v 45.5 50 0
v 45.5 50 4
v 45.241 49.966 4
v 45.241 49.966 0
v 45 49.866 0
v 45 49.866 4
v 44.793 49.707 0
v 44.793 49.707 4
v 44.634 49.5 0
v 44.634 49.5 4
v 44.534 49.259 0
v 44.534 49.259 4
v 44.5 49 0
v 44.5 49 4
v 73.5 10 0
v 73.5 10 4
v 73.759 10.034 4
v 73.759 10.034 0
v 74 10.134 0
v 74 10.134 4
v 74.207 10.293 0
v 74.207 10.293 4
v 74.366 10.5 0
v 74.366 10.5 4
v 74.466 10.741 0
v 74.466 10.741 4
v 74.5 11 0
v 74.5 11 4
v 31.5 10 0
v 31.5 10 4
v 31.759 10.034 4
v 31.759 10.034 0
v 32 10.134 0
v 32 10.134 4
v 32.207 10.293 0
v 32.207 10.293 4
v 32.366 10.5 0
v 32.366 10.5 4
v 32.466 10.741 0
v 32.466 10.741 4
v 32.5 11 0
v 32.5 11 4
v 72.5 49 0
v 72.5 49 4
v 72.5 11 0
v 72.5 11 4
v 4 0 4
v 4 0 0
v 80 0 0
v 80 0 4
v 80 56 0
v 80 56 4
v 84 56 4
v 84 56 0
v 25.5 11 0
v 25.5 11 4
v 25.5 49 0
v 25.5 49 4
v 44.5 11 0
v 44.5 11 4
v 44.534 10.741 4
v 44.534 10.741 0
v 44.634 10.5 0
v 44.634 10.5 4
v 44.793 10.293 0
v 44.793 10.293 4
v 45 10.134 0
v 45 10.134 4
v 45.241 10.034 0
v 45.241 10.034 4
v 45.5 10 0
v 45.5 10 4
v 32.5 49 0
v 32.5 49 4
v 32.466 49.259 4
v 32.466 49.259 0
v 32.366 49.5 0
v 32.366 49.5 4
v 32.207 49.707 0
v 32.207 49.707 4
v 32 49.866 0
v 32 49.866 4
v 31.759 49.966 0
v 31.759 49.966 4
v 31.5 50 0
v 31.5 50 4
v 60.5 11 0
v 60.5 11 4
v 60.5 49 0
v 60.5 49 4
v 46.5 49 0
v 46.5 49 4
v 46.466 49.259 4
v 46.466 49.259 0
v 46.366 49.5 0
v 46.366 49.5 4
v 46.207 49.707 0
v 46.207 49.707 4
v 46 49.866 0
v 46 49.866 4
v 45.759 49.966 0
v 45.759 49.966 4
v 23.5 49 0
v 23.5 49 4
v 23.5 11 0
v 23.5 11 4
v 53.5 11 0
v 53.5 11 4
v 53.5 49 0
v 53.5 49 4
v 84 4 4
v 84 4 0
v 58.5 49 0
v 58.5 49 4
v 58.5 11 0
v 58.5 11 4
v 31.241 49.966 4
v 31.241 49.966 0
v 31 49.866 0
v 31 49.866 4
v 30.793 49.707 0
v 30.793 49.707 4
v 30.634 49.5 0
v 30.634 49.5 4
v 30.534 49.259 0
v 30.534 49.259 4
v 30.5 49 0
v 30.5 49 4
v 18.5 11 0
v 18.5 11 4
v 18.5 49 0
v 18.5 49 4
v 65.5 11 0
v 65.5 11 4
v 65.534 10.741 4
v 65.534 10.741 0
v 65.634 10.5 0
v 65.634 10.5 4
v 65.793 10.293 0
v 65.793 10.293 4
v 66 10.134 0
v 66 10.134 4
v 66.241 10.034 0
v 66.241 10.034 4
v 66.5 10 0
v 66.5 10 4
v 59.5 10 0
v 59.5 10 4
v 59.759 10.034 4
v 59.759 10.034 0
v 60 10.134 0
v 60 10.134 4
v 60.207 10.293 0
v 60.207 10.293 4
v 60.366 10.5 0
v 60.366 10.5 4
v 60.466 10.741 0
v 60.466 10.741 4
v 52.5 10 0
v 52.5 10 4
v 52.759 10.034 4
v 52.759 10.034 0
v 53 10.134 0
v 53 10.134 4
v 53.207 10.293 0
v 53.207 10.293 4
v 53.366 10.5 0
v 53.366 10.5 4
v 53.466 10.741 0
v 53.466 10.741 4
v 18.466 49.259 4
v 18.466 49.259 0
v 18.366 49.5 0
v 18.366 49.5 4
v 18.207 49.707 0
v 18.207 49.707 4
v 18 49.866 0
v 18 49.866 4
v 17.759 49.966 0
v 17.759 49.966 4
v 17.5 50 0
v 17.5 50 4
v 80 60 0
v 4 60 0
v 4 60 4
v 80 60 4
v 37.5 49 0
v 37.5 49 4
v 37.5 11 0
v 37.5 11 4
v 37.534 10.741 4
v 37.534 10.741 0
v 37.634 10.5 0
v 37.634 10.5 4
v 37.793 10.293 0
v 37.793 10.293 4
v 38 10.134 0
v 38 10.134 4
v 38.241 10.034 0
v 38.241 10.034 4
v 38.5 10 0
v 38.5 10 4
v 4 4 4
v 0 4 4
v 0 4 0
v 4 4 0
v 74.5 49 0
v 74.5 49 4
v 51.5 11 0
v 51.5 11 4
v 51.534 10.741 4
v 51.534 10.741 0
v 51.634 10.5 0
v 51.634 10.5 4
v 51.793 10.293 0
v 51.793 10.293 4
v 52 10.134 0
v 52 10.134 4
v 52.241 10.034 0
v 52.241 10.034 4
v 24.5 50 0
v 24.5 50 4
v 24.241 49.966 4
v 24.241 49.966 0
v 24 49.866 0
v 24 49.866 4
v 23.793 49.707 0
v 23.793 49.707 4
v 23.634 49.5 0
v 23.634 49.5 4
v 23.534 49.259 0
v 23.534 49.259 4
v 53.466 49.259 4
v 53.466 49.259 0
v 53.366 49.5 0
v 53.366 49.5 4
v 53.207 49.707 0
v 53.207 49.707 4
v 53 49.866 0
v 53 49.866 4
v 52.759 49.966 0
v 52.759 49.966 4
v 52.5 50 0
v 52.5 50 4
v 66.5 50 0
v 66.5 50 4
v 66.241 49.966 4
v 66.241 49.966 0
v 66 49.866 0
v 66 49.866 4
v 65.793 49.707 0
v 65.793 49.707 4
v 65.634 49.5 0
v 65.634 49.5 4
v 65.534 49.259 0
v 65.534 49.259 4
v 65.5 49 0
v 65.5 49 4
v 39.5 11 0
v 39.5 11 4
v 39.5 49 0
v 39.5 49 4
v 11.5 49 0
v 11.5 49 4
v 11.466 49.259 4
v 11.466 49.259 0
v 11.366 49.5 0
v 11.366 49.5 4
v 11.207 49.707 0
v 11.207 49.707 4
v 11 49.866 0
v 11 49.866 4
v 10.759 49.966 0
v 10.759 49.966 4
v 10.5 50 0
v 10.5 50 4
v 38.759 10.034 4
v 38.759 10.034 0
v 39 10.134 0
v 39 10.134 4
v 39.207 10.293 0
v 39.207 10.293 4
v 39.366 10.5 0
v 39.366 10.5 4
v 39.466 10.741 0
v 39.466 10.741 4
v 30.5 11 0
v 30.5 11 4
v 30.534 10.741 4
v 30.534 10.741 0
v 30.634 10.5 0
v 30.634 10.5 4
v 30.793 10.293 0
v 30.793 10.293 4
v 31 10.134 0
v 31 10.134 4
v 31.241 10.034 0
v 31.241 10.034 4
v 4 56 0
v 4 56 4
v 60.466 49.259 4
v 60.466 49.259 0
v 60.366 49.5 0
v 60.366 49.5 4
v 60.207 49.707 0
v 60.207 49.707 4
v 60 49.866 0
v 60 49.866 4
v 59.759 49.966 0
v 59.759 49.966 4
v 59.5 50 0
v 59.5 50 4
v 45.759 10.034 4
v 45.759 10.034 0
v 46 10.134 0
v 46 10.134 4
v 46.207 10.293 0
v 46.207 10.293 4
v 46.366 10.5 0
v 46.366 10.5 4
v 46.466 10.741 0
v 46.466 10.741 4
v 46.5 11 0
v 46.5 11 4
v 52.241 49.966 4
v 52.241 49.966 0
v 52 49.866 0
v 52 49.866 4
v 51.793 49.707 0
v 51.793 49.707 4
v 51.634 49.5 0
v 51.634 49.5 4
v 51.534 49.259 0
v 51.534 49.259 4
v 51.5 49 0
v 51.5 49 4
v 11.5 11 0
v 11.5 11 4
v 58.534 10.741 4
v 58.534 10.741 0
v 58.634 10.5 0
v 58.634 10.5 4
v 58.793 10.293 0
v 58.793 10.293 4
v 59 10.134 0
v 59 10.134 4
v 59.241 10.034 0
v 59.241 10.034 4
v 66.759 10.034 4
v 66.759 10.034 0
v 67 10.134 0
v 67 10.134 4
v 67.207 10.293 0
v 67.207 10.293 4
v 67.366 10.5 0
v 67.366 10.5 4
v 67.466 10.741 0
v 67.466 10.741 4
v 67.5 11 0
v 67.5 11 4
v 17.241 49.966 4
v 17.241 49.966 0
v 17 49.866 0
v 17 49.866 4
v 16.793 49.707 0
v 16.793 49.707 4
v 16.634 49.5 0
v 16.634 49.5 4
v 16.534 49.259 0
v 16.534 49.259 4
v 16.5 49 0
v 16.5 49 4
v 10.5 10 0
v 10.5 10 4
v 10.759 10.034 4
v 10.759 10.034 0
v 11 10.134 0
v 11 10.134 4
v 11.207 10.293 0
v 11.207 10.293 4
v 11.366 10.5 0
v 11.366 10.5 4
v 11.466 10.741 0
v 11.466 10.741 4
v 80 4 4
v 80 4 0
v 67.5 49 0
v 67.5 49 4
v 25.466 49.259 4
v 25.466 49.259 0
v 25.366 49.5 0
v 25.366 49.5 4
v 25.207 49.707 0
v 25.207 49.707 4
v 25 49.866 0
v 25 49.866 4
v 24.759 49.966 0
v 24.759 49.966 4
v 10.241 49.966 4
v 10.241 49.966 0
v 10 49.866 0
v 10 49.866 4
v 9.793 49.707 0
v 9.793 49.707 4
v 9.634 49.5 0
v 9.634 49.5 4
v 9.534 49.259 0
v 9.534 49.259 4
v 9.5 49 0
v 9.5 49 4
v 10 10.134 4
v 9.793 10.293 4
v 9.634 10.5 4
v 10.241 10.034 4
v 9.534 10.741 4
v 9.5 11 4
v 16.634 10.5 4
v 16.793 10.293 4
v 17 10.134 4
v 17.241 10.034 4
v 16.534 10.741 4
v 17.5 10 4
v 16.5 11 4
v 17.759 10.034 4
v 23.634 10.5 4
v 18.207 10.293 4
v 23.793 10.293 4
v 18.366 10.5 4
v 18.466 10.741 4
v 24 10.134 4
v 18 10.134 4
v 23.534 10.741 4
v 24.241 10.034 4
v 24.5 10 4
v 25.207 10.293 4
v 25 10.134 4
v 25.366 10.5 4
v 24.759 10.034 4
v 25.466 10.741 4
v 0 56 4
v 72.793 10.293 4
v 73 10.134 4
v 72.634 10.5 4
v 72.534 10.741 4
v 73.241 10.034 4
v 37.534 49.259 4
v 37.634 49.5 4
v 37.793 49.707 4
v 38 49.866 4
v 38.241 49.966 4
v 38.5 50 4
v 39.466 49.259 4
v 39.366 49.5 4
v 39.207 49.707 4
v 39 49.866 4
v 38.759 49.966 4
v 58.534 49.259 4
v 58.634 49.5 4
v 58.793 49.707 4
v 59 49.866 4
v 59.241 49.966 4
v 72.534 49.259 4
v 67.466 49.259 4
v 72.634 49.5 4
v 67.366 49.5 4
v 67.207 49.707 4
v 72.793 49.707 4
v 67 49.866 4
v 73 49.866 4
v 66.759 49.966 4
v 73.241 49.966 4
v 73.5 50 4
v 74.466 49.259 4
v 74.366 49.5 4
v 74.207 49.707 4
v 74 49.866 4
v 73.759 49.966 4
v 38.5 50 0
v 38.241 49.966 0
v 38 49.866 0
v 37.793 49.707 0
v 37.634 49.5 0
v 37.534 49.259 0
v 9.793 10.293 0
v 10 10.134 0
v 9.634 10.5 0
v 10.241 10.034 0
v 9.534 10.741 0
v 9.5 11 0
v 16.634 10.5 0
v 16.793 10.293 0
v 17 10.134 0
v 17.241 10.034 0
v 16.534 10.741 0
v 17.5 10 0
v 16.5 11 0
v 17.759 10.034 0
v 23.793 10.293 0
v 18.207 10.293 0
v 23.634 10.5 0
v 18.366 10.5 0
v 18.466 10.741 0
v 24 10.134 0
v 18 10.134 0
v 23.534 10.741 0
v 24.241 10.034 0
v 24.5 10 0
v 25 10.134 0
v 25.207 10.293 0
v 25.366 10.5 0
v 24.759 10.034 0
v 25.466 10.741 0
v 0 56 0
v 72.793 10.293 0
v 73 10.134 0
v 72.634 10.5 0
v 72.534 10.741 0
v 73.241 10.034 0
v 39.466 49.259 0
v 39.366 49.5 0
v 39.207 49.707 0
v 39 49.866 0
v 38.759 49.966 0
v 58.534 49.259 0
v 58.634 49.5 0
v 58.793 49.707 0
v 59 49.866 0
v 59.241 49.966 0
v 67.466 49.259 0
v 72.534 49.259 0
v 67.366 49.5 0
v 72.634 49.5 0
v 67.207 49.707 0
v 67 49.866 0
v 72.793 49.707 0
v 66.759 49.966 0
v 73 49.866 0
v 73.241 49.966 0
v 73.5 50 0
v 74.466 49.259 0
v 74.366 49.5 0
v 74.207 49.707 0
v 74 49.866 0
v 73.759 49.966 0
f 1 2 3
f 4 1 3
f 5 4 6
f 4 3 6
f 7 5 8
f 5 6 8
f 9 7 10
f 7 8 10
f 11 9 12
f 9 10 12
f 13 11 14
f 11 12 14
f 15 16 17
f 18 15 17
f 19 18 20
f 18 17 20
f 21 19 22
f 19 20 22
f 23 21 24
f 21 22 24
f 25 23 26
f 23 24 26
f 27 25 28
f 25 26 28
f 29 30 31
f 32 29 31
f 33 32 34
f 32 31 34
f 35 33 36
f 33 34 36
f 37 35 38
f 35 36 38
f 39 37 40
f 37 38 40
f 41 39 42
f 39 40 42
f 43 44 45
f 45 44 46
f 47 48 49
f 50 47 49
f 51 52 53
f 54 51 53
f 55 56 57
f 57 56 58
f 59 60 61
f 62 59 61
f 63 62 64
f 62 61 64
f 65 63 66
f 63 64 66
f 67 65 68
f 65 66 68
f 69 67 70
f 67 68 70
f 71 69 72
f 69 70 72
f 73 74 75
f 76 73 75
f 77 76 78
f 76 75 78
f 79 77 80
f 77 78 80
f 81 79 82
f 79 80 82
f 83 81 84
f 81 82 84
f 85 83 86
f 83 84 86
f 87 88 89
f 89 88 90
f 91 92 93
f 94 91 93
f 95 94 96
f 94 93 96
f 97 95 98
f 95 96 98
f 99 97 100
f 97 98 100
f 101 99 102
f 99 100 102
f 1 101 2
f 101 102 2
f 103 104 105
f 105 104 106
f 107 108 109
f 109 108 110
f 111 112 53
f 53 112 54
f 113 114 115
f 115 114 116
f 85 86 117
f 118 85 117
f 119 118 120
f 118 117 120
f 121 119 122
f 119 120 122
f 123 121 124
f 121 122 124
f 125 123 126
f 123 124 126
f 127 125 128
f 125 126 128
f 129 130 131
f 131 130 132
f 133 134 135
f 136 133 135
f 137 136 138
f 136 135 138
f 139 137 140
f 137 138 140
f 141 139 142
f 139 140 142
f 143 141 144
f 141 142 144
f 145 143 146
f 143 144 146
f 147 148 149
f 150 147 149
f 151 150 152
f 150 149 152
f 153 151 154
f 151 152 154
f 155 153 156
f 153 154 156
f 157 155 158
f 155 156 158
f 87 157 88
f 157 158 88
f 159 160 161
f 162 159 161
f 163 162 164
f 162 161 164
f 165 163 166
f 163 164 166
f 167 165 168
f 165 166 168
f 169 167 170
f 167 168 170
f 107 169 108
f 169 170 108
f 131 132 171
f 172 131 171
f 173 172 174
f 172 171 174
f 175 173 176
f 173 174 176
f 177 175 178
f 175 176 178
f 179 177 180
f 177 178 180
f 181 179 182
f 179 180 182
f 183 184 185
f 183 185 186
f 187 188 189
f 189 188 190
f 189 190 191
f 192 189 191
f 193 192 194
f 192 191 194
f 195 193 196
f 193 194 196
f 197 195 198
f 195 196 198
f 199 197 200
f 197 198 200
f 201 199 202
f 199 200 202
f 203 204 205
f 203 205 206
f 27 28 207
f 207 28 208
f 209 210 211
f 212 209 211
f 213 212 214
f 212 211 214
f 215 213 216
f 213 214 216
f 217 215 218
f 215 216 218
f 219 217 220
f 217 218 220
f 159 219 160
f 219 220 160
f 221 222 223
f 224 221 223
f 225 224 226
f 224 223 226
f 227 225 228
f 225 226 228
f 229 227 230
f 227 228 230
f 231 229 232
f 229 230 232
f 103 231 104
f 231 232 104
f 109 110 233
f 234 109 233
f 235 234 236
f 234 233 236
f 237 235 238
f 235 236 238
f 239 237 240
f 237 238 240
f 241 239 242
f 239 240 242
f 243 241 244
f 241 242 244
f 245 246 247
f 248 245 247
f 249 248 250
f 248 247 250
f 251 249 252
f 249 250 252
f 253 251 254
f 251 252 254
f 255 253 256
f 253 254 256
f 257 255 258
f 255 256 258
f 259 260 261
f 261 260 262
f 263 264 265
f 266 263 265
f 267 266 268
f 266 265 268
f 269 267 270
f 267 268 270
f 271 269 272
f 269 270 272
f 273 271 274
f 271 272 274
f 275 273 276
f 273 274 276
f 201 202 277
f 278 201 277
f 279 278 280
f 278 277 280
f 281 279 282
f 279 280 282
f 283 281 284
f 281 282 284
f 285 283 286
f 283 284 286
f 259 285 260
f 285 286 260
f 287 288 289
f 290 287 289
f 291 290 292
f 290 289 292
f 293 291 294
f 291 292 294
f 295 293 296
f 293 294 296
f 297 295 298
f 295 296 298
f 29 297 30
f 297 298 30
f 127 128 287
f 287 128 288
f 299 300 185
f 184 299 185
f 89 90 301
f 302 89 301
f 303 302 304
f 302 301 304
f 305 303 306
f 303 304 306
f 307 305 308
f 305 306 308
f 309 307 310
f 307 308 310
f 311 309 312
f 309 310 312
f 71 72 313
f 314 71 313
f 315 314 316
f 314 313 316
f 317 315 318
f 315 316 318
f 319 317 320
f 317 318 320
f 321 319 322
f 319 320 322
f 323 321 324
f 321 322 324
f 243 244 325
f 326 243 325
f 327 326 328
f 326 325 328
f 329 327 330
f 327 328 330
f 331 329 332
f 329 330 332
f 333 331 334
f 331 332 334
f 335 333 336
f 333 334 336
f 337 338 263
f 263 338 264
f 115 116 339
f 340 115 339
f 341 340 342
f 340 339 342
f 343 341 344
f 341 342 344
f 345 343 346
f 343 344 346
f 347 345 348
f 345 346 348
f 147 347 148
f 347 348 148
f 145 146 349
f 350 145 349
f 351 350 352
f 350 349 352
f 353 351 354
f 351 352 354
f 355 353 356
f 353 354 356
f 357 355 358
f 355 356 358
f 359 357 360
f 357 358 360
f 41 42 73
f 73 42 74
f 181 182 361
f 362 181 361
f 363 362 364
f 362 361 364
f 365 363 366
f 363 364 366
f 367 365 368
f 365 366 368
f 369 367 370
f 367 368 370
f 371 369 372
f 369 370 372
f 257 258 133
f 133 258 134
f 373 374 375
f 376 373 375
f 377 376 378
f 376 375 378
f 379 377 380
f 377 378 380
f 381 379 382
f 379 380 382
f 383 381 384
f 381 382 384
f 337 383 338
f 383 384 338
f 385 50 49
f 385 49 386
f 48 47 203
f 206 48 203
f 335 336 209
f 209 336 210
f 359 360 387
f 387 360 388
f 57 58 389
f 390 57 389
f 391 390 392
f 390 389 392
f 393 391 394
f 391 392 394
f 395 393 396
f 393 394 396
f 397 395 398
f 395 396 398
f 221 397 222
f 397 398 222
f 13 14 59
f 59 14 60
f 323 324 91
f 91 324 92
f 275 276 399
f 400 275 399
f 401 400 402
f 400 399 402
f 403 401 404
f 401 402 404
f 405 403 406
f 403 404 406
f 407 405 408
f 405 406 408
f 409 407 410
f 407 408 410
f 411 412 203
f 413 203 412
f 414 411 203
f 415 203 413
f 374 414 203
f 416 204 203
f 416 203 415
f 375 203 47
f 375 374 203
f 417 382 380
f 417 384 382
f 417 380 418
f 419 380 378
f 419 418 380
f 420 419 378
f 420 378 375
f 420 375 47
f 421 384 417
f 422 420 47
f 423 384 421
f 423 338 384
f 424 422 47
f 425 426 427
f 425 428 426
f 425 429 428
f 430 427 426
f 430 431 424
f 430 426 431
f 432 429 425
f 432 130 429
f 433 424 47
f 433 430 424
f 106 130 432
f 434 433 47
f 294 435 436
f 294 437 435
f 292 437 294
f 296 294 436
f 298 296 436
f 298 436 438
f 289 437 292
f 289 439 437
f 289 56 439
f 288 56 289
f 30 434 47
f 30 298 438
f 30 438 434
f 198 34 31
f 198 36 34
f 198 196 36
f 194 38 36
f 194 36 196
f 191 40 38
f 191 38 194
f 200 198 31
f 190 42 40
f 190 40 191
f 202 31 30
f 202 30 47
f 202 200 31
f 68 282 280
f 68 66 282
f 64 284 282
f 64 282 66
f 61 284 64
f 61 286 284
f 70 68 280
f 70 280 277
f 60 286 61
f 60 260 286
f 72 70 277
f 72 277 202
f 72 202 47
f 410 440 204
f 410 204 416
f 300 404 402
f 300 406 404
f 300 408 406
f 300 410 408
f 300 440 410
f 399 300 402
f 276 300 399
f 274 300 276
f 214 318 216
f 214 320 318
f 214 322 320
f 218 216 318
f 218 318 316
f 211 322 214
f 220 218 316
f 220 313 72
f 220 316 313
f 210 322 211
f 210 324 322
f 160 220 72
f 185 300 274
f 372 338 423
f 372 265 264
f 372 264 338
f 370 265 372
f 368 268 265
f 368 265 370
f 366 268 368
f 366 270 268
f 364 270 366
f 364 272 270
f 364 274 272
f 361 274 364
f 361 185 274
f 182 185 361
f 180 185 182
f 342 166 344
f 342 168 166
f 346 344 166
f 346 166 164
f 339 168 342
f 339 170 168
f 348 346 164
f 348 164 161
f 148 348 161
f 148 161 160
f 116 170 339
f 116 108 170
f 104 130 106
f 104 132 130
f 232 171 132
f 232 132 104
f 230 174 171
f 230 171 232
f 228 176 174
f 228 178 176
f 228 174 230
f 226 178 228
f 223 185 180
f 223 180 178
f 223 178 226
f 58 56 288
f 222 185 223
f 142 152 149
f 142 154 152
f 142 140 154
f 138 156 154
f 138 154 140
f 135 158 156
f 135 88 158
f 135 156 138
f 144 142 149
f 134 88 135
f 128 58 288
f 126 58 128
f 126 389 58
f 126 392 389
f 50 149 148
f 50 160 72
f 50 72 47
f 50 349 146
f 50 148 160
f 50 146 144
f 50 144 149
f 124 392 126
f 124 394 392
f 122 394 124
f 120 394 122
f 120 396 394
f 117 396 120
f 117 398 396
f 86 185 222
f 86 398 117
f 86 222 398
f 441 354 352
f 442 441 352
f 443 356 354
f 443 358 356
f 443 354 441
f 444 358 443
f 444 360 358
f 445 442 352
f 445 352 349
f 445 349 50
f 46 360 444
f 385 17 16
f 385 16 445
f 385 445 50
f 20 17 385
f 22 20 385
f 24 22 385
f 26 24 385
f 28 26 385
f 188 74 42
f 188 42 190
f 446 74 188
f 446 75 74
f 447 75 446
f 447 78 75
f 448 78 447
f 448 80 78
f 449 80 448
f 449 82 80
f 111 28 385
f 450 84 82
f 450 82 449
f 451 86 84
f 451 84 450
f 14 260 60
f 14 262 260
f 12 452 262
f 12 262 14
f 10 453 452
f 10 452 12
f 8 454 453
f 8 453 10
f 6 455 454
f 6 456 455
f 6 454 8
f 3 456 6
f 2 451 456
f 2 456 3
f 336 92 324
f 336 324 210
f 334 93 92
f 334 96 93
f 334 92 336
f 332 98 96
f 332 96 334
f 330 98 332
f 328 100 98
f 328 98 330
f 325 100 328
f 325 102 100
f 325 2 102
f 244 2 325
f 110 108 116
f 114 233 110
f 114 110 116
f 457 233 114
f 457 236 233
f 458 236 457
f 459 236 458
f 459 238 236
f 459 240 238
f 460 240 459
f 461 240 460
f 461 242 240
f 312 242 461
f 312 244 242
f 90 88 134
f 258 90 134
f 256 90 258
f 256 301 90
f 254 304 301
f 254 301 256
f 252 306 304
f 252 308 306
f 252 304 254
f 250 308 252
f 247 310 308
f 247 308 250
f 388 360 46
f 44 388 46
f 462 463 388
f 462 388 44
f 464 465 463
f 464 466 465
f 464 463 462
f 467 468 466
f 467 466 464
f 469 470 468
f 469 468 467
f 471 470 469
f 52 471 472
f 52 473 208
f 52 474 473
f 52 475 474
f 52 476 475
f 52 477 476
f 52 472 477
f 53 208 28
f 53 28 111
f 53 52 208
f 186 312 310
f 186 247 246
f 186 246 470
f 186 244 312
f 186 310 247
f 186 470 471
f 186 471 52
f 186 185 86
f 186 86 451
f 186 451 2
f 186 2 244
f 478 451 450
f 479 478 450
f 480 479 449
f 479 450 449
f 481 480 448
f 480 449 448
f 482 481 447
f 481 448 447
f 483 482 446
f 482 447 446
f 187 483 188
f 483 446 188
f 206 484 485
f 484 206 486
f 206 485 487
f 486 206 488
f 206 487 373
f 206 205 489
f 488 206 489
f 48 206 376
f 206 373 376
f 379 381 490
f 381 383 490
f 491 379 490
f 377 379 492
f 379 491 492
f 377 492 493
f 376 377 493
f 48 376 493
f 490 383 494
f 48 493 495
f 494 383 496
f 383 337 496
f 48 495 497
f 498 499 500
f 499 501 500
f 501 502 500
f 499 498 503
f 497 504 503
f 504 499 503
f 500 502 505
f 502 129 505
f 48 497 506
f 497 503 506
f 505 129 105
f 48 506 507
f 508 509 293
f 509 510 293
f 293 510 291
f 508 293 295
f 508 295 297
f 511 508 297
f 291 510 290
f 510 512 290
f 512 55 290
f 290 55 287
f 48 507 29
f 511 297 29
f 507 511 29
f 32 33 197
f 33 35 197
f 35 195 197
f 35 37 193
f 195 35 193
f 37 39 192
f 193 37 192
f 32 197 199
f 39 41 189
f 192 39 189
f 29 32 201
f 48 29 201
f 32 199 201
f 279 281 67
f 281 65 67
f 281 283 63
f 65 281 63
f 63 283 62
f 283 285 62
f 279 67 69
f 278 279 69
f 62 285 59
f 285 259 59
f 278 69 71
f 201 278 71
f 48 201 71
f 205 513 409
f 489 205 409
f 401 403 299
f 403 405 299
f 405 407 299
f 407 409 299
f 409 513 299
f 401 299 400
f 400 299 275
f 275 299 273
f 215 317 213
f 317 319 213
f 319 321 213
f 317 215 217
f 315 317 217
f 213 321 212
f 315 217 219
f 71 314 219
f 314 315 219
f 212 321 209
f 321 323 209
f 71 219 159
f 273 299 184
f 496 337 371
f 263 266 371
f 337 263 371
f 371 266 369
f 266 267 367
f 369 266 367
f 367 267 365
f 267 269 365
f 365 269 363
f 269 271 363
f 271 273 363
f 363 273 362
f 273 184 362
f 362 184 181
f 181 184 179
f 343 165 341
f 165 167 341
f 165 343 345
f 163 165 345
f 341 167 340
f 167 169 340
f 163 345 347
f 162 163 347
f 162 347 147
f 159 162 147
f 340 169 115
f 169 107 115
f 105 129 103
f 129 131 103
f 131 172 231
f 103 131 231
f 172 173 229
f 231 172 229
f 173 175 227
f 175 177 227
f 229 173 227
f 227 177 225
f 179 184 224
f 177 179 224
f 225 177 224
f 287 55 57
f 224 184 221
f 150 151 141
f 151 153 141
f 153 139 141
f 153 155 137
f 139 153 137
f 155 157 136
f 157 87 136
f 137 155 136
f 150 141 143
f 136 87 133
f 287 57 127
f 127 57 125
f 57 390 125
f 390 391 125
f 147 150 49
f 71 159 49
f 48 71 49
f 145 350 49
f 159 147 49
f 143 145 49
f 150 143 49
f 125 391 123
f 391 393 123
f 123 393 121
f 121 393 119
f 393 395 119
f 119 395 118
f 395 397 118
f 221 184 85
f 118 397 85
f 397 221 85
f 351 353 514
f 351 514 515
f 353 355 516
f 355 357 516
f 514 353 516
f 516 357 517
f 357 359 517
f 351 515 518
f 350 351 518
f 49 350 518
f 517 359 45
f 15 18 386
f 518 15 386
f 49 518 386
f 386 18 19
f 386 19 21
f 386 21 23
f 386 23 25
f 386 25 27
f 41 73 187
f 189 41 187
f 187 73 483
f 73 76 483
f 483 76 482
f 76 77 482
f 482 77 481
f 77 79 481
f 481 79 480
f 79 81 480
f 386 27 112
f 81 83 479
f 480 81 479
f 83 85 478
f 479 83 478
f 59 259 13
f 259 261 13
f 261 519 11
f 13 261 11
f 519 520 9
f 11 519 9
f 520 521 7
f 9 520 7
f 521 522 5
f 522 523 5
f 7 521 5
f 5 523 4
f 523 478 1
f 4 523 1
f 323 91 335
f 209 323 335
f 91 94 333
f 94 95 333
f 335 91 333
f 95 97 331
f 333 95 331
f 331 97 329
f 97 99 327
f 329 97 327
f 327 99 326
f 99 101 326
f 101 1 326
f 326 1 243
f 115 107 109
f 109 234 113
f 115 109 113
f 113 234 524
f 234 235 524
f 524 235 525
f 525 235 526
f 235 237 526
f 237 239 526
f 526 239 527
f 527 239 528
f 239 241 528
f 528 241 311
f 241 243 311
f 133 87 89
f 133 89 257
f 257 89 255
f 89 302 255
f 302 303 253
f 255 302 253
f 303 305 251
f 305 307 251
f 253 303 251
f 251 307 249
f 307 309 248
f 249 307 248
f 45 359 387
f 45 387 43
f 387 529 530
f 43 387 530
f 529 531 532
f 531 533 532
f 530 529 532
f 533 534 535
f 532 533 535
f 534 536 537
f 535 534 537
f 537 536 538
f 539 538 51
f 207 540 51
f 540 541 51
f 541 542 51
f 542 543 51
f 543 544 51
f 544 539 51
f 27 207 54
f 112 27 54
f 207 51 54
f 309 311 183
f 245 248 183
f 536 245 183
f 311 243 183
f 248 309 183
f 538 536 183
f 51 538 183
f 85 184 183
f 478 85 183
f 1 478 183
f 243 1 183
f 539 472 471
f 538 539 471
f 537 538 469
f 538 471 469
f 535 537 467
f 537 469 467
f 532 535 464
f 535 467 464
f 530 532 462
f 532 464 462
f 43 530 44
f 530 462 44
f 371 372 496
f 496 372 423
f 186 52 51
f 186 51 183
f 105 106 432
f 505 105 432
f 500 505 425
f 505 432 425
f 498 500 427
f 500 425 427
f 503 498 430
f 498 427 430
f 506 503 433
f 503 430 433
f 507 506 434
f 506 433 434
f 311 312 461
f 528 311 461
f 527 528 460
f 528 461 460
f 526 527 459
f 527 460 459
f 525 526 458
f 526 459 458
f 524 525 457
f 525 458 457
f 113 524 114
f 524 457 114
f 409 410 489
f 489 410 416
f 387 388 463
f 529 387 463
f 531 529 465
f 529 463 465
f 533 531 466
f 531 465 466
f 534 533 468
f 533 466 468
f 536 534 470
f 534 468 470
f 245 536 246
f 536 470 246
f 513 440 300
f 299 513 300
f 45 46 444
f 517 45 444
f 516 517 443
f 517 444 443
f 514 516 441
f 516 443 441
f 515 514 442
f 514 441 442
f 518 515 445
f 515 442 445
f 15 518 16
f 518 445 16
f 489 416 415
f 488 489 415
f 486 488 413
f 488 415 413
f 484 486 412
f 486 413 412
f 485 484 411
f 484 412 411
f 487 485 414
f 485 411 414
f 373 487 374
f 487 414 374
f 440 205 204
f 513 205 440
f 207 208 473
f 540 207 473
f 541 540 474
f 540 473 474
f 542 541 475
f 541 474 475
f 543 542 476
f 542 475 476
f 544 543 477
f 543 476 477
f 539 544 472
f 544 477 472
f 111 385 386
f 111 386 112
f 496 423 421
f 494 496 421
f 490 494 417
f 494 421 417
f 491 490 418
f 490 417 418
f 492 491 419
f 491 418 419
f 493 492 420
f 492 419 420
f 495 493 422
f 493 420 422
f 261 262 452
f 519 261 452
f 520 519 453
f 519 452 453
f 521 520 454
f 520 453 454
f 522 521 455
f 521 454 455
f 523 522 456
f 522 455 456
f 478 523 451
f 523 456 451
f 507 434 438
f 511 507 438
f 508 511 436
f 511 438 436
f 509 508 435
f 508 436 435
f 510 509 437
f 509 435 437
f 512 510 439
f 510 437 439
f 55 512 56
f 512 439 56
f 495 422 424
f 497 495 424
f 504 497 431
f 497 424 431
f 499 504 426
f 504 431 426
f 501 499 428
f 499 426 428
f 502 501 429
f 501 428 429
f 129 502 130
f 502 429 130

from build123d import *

# Parameters (mm, degrees)
F0_W     = 84
F0_H     = 60
F1_DEPTH = 4
F2_W     = 4
F2_H     = 4
F3_DEPTH = 4
F5_DEPTH = 4


with BuildPart() as f1:
    # F0 (on Top) → F1 (new body)
    with BuildSketch(Plane.XY):
        with Locations((42, 30)):
            Rectangle(F0_W, F0_H)
    extrude(amount=F1_DEPTH)

    # F2 (on face) → F3 (cut, through all)
    with BuildSketch(Plane.XY.offset(4)):
        with Locations((2, 2)):
            Rectangle(F2_W, F2_H)
        with Locations((2, 58)):
            Rectangle(F2_W, F2_H)
        with Locations((82, 2)):
            Rectangle(F2_W, F2_H)
        with Locations((82, 58)):
            Rectangle(F2_W, F2_H)
    extrude(amount=-F3_DEPTH, mode=Mode.SUBTRACT)

    # F4 (on face) → F5 (cut, through all)
    with BuildSketch(Plane.XY.offset(4)):
        with BuildLine():
            ThreePointArc((10.5, 50), (9.792893, 49.707107), (9.5, 49))
            Line((9.5, 49), (9.5, 11))
            ThreePointArc((9.5, 11), (9.792893, 10.292893), (10.5, 10))
            ThreePointArc((10.5, 10), (11.207107, 10.292893), (11.5, 11))
            Line((11.5, 11), (11.5, 49))
            ThreePointArc((11.5, 49), (11.207107, 49.707107), (10.5, 50))
        make_face()
        with BuildLine():
            ThreePointArc((17.5, 50), (16.792893, 49.707107), (16.5, 49))
            Line((16.5, 49), (16.5, 11))
            ThreePointArc((16.5, 11), (16.792893, 10.292893), (17.5, 10))
            ThreePointArc((17.5, 10), (18.207107, 10.292893), (18.5, 11))
            Line((18.5, 11), (18.5, 49))
            ThreePointArc((18.5, 49), (18.207107, 49.707107), (17.5, 50))
        make_face()
        with BuildLine():
            ThreePointArc((24.5, 50), (23.792893, 49.707107), (23.5, 49))
            Line((23.5, 49), (23.5, 11))
            ThreePointArc((23.5, 11), (23.792893, 10.292893), (24.5, 10))
            ThreePointArc((24.5, 10), (25.207107, 10.292893), (25.5, 11))
            Line((25.5, 11), (25.5, 49))
            ThreePointArc((25.5, 49), (25.207107, 49.707107), (24.5, 50))
        make_face()
        with BuildLine():
            ThreePointArc((31.5, 50), (30.792893, 49.707107), (30.5, 49))
            Line((30.5, 49), (30.5, 11))
            ThreePointArc((30.5, 11), (30.792893, 10.292893), (31.5, 10))
            ThreePointArc((31.5, 10), (32.207107, 10.292893), (32.5, 11))
            Line((32.5, 11), (32.5, 49))
            ThreePointArc((32.5, 49), (32.207107, 49.707107), (31.5, 50))
        make_face()
        with BuildLine():
            ThreePointArc((38.5, 50), (37.792893, 49.707107), (37.5, 49))
            Line((37.5, 49), (37.5, 11))
            ThreePointArc((37.5, 11), (37.792893, 10.292893), (38.5, 10))
            ThreePointArc((38.5, 10), (39.207107, 10.292893), (39.5, 11))
            Line((39.5, 11), (39.5, 49))
            ThreePointArc((39.5, 49), (39.207107, 49.707107), (38.5, 50))
        make_face()
        with BuildLine():
            ThreePointArc((45.5, 50), (44.792893, 49.707107), (44.5, 49))
            Line((44.5, 49), (44.5, 11))
            ThreePointArc((44.5, 11), (44.792893, 10.292893), (45.5, 10))
            ThreePointArc((45.5, 10), (46.207107, 10.292893), (46.5, 11))
            Line((46.5, 11), (46.5, 49))
            ThreePointArc((46.5, 49), (46.207107, 49.707107), (45.5, 50))
        make_face()
        with BuildLine():
            ThreePointArc((52.5, 50), (51.792893, 49.707107), (51.5, 49))
            Line((51.5, 49), (51.5, 11))
            ThreePointArc((51.5, 11), (51.792893, 10.292893), (52.5, 10))
            ThreePointArc((52.5, 10), (53.207107, 10.292893), (53.5, 11))
            Line((53.5, 11), (53.5, 49))
            ThreePointArc((53.5, 49), (53.207107, 49.707107), (52.5, 50))
        make_face()
        with BuildLine():
            ThreePointArc((59.5, 50), (58.792893, 49.707107), (58.5, 49))
            Line((58.5, 49), (58.5, 11))
            ThreePointArc((58.5, 11), (58.792893, 10.292893), (59.5, 10))
            ThreePointArc((59.5, 10), (60.207107, 10.292893), (60.5, 11))
            Line((60.5, 11), (60.5, 49))
            ThreePointArc((60.5, 49), (60.207107, 49.707107), (59.5, 50))
        make_face()
        with BuildLine():
            ThreePointArc((66.5, 50), (65.792893, 49.707107), (65.5, 49))
            Line((65.5, 49), (65.5, 11))
            ThreePointArc((65.5, 11), (65.792893, 10.292893), (66.5, 10))
            ThreePointArc((66.5, 10), (67.207107, 10.292893), (67.5, 11))
            Line((67.5, 11), (67.5, 49))
            ThreePointArc((67.5, 49), (67.207107, 49.707107), (66.5, 50))
        make_face()
        with BuildLine():
            ThreePointArc((73.5, 50), (72.792893, 49.707107), (72.5, 49))
            Line((72.5, 49), (72.5, 11))
            ThreePointArc((72.5, 11), (72.792893, 10.292893), (73.5, 10))
            ThreePointArc((73.5, 10), (74.207107, 10.292893), (74.5, 11))
            Line((74.5, 11), (74.5, 49))
            ThreePointArc((74.5, 49), (74.207107, 49.707107), (73.5, 50))
        make_face()
    extrude(amount=-F5_DEPTH, mode=Mode.SUBTRACT)


solid = f1.part
